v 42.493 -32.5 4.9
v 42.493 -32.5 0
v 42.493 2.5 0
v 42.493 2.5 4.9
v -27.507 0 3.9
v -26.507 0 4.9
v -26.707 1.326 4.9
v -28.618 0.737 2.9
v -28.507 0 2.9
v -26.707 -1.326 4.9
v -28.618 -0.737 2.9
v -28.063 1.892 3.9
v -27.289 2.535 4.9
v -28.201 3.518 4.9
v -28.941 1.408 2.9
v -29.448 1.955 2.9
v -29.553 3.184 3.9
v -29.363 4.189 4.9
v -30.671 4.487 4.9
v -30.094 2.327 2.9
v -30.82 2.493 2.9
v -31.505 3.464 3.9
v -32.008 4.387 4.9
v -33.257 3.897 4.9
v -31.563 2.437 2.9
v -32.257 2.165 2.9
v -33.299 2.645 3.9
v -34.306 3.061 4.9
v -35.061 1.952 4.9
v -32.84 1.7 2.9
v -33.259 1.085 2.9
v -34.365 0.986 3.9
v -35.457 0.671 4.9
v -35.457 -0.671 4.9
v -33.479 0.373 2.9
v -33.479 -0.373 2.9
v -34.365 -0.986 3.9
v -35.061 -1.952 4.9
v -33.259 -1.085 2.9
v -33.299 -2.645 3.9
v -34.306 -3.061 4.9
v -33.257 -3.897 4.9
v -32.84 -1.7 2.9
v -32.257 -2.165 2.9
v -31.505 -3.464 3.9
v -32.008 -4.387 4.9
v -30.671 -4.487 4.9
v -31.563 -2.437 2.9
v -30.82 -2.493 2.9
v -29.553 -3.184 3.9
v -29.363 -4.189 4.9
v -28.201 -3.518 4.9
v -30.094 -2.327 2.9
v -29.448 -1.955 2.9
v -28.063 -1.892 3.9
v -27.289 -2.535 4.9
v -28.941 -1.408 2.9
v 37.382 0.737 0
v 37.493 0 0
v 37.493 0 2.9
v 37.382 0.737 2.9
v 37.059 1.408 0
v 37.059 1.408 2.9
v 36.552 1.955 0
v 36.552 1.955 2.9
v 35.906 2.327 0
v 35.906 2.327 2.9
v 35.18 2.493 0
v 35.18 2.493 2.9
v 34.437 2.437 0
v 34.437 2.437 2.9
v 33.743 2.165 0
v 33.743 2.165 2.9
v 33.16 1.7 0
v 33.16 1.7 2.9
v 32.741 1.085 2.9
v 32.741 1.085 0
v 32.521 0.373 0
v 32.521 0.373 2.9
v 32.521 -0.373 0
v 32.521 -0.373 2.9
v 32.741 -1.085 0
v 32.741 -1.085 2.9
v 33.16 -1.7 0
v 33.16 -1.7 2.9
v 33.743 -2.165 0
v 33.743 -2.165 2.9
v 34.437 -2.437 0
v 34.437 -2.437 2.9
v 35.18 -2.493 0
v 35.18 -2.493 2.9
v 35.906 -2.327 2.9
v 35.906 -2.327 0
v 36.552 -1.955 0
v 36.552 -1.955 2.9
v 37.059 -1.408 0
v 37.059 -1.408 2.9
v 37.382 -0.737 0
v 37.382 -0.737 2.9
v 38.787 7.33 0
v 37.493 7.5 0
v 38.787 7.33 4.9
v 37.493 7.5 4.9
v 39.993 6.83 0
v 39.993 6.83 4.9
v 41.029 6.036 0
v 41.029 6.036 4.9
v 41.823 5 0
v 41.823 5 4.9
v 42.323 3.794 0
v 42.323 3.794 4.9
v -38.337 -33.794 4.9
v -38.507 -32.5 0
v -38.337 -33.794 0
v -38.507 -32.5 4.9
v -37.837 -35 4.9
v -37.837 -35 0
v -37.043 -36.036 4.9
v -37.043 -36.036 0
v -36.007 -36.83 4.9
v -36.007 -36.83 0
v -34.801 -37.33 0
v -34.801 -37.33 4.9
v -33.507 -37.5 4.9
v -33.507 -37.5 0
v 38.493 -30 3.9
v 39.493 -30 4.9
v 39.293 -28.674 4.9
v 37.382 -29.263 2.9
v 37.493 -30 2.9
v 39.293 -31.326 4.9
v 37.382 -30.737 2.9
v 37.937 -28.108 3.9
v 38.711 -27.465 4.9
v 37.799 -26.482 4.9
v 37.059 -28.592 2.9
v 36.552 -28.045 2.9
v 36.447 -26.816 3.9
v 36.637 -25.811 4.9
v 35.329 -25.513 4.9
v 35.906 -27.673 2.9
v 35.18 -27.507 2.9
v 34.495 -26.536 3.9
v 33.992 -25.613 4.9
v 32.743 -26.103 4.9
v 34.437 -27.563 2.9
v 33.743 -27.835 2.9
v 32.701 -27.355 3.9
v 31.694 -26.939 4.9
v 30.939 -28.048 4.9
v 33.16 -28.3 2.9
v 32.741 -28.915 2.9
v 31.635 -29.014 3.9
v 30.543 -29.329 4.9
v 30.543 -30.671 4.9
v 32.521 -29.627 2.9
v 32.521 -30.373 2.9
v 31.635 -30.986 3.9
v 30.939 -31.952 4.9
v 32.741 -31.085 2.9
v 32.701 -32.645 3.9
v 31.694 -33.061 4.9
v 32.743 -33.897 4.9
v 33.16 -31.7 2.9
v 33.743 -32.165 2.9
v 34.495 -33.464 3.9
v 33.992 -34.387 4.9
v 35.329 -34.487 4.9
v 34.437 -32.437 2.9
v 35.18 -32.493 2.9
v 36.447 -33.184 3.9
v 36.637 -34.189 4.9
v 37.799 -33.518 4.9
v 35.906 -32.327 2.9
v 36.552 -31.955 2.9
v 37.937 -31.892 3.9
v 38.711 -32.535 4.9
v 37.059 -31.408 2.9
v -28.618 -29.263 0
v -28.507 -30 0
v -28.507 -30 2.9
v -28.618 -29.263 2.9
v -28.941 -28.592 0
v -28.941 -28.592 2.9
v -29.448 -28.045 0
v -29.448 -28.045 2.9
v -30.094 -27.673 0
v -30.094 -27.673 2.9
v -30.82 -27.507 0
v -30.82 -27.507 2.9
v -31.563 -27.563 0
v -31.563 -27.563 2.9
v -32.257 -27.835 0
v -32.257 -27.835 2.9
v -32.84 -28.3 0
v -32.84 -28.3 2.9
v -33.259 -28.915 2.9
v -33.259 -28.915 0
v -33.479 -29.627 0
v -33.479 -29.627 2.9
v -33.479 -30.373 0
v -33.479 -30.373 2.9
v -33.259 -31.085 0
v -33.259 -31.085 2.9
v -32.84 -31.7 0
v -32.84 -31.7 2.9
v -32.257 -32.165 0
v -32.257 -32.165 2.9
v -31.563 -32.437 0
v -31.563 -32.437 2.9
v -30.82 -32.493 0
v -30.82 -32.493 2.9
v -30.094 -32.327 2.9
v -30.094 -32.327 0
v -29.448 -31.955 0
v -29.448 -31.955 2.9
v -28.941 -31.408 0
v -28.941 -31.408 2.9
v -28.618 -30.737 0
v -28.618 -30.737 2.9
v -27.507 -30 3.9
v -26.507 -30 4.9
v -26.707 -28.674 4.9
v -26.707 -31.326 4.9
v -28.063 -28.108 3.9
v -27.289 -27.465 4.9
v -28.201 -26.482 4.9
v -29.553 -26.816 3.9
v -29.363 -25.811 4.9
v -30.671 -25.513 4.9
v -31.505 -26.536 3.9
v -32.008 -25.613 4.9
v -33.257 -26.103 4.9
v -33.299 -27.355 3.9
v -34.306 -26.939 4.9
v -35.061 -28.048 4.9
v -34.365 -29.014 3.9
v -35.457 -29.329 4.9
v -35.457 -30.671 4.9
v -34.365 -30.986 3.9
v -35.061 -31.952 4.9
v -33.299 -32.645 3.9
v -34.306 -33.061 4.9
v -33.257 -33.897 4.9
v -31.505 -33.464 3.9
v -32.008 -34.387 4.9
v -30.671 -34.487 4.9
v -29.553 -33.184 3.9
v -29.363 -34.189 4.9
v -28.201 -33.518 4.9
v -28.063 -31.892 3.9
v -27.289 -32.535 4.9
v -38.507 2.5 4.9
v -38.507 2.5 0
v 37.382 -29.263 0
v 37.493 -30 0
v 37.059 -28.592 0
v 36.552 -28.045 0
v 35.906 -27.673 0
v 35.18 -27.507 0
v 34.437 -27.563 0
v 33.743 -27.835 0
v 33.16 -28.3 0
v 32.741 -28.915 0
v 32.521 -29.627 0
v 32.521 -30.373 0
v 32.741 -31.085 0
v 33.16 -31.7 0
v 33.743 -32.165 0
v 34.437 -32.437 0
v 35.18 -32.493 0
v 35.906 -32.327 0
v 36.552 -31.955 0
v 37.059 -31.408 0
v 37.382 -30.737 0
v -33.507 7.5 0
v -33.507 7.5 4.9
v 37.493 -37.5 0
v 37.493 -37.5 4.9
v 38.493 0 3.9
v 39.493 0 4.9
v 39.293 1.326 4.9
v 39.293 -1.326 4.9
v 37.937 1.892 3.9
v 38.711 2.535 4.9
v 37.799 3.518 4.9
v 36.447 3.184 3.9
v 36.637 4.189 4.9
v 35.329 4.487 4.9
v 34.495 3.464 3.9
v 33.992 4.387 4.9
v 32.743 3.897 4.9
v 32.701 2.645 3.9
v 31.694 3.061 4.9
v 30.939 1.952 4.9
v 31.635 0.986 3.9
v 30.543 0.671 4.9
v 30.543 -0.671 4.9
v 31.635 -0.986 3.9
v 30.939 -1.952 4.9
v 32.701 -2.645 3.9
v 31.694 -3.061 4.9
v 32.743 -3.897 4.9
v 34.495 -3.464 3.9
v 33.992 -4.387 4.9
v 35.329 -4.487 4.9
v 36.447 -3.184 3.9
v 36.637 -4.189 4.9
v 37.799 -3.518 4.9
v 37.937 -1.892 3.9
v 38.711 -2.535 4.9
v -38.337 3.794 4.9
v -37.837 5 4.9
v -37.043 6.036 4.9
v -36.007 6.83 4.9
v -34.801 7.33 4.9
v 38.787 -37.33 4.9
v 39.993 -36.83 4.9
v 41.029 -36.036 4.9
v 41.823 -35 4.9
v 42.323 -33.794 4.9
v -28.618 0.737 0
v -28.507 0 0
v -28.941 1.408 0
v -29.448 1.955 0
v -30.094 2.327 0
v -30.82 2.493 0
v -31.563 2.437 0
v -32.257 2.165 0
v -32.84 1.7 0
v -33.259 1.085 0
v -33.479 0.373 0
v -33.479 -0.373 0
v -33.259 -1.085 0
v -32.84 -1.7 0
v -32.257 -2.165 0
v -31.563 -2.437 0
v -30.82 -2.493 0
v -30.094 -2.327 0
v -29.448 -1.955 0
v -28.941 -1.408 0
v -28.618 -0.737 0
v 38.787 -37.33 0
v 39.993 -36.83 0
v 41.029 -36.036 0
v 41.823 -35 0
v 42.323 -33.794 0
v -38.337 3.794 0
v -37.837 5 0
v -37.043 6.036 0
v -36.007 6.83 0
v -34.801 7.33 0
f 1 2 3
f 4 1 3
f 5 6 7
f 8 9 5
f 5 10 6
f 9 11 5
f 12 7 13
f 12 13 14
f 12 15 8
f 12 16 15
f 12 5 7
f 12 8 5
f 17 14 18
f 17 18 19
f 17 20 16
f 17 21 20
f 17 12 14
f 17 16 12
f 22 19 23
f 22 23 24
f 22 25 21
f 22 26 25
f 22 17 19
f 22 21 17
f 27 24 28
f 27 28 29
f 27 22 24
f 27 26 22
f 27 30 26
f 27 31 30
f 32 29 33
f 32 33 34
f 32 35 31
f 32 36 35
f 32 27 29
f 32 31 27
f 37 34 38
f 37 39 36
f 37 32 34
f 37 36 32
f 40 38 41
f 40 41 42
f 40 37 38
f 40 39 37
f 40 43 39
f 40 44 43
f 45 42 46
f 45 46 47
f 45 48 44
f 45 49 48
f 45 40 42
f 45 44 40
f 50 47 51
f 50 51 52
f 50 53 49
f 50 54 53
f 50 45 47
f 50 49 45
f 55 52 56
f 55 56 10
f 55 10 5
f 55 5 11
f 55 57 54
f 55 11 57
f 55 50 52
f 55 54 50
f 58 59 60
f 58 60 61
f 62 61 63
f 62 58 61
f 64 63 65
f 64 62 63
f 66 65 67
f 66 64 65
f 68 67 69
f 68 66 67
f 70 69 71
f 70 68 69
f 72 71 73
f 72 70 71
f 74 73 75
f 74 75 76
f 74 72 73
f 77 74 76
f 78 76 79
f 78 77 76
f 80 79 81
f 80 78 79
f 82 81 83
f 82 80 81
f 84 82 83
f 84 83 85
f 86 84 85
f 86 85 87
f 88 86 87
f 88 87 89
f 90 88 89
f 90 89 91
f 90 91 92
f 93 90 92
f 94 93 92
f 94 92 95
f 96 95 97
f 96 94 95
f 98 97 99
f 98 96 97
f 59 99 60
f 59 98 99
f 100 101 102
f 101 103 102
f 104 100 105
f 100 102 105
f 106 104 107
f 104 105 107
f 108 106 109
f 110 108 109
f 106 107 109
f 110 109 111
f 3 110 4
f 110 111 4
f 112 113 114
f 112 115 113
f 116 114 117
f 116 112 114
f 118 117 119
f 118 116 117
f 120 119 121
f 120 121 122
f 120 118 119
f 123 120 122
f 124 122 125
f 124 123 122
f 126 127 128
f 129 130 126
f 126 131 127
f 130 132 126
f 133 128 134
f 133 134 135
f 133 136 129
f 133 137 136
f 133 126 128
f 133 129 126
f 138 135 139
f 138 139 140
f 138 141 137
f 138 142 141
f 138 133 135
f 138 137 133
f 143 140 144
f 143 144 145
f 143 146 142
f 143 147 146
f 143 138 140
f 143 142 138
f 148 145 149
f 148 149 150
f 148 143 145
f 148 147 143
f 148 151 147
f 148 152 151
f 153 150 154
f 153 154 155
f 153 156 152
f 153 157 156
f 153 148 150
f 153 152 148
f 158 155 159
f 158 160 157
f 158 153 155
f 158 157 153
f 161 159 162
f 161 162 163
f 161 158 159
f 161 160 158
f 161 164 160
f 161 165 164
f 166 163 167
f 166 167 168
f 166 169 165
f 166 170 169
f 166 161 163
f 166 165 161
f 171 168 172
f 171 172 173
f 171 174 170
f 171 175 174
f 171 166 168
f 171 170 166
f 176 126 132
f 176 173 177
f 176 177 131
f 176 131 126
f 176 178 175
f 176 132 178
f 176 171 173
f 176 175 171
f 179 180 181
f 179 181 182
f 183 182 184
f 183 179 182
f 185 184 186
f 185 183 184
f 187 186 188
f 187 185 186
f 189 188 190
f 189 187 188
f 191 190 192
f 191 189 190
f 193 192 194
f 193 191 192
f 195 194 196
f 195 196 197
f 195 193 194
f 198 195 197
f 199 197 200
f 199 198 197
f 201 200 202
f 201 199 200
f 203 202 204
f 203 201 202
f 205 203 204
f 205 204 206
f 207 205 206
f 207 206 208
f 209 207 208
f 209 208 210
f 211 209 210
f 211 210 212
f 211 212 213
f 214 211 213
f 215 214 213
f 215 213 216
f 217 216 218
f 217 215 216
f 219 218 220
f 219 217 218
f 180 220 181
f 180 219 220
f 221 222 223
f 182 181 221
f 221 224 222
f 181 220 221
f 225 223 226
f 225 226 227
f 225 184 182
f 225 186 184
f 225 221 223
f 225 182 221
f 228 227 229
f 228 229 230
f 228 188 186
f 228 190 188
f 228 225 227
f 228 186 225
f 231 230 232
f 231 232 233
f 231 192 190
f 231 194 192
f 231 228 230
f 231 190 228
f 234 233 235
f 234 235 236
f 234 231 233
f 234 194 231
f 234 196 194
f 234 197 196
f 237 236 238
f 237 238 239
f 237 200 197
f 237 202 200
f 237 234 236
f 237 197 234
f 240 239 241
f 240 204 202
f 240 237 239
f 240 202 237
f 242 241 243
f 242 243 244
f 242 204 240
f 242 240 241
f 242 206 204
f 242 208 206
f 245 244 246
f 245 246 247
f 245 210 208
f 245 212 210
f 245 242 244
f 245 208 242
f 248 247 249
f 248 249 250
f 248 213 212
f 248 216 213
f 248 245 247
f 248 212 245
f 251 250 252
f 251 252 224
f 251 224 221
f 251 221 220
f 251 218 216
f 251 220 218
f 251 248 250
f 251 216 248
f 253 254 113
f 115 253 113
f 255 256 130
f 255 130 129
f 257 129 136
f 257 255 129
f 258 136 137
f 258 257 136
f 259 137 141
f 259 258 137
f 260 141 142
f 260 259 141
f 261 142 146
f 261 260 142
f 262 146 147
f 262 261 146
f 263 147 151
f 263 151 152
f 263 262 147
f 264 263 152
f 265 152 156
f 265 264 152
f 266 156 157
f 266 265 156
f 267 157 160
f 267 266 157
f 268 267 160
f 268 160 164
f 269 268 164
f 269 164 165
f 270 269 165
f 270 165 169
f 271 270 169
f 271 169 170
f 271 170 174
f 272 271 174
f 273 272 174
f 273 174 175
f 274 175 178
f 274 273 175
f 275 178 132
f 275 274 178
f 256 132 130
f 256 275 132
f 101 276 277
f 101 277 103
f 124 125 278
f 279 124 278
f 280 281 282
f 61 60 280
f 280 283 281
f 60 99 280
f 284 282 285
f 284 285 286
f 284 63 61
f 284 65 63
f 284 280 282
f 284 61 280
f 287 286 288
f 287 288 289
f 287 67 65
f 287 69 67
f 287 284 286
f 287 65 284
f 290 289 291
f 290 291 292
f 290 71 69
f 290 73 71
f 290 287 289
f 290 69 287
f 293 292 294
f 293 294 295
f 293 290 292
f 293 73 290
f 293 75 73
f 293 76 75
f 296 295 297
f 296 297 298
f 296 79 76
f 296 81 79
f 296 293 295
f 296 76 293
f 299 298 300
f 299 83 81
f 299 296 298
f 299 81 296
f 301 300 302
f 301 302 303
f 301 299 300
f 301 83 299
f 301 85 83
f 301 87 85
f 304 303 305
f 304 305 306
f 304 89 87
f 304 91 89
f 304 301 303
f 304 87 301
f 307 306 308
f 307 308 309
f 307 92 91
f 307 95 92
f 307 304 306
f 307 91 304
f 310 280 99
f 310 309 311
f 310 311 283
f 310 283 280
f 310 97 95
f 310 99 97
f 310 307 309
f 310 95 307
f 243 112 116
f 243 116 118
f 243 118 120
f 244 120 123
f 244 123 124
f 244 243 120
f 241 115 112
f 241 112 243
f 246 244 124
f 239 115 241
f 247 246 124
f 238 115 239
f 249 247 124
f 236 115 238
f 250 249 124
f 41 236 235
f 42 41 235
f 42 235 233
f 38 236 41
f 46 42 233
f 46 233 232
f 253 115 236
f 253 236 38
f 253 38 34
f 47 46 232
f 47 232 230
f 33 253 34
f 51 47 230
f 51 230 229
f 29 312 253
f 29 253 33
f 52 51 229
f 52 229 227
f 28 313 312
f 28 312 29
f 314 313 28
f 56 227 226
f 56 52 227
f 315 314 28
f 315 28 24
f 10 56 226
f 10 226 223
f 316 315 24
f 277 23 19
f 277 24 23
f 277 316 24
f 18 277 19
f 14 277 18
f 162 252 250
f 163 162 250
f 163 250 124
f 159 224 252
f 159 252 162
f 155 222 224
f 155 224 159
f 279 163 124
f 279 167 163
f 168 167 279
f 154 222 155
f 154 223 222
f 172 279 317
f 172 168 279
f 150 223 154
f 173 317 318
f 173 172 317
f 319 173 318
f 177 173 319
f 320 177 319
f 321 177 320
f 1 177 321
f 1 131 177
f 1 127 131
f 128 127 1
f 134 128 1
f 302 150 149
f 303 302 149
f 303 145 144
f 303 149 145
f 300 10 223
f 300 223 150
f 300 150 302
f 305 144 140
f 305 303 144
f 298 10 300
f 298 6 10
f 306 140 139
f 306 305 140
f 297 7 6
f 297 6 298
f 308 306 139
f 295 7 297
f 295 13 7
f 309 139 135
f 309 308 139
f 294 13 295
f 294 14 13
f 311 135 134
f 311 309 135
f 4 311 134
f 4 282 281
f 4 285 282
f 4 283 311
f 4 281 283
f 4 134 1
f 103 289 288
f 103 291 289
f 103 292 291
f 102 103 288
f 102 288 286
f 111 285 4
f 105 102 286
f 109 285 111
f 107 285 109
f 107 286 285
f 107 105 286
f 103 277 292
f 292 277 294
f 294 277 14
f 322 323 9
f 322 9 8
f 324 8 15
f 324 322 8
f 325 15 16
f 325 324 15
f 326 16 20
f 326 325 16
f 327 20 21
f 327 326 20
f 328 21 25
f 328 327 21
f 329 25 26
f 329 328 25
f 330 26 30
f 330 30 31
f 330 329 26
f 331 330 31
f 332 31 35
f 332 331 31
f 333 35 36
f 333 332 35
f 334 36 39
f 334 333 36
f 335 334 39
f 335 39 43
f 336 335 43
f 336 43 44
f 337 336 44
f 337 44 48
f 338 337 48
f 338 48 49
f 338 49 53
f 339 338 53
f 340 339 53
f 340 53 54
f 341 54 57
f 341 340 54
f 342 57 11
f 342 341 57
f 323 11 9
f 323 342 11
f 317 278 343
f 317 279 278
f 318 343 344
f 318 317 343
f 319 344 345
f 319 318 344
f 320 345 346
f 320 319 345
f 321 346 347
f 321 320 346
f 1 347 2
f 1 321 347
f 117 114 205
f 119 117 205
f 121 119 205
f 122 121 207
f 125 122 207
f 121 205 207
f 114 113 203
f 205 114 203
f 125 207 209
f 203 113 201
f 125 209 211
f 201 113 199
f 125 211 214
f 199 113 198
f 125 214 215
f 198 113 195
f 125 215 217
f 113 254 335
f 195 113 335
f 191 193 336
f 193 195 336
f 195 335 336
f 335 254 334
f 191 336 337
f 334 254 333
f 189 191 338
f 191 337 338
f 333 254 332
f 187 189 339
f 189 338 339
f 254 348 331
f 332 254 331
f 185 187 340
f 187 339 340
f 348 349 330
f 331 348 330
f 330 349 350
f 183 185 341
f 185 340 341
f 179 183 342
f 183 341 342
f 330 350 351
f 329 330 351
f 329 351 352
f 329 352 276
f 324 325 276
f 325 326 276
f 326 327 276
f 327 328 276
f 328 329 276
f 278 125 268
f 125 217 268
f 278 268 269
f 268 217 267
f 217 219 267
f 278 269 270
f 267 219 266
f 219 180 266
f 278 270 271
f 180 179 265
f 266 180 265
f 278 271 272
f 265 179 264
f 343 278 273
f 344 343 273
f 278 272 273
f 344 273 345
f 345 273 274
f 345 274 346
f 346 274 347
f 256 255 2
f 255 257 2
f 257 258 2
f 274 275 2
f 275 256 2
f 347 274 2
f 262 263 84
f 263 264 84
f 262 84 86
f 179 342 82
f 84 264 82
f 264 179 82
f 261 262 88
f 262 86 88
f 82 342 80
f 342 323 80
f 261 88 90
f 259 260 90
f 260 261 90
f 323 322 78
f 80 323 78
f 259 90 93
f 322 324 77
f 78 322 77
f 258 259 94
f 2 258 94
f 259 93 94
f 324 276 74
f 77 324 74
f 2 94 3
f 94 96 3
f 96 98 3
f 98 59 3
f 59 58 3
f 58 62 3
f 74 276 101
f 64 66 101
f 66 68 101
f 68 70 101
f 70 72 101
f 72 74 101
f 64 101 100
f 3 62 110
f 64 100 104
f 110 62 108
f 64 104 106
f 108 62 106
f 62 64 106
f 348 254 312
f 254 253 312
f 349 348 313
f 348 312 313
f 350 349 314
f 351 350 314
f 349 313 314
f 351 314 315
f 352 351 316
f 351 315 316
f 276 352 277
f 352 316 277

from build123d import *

# Parameters (mm, degrees)
F0_W     = 81
F0_H     = 15
F0_R     = 2.5
F0_H_2   = 30
F1_DEPTH = 4.9
F2_R     = 5
F3_R     = 5
F4_SIZE  = 2


with BuildPart() as f1:
    # F0 (on Top) → F1 (new body)
    with BuildSketch(Plane.XY):
        with Locations((1.9929800031, 0)):
            Rectangle(F0_W, F0_H)
        with Locations((-31.0070199969, 0)):
            Circle(F0_R, mode=Mode.SUBTRACT)
        with Locations((34.9929800031, 0)):
            Circle(F0_R, mode=Mode.SUBTRACT)
        with Locations((1.9929800031, -22.5)):
            Rectangle(F0_W, F0_H_2)
        with Locations((-31.0070199969, -30)):
            Circle(F0_R, mode=Mode.SUBTRACT)
        with Locations((34.9929800031, -30)):
            Circle(F0_R, mode=Mode.SUBTRACT)
    extrude(amount=F1_DEPTH)

    # F2
    f2_edges = [f1.edges().sort_by_distance(p)[0] for p in [
        (42.49298, 7.5, 2.45),
        (-38.50702, 7.5, 2.45),
    ]]
    fillet(f2_edges, radius=F2_R)

    # F3
    f3_edges = [f1.edges().sort_by_distance(p)[0] for p in [
        (42.49298, -37.5, 2.45),
        (-38.50702, -37.5, 2.45),
    ]]
    fillet(f3_edges, radius=F3_R)

    # F4
    f4_edges = [f1.edges().sort_by_distance(p)[0] for p in [
        (32.49298, 0, 4.9),
        (32.49298, -30, 4.9),
        (-33.50702, 0, 4.9),
        (-33.50702, -30, 4.9),
    ]]
    chamfer(f4_edges, length=F4_SIZE)


solid = f1.part
